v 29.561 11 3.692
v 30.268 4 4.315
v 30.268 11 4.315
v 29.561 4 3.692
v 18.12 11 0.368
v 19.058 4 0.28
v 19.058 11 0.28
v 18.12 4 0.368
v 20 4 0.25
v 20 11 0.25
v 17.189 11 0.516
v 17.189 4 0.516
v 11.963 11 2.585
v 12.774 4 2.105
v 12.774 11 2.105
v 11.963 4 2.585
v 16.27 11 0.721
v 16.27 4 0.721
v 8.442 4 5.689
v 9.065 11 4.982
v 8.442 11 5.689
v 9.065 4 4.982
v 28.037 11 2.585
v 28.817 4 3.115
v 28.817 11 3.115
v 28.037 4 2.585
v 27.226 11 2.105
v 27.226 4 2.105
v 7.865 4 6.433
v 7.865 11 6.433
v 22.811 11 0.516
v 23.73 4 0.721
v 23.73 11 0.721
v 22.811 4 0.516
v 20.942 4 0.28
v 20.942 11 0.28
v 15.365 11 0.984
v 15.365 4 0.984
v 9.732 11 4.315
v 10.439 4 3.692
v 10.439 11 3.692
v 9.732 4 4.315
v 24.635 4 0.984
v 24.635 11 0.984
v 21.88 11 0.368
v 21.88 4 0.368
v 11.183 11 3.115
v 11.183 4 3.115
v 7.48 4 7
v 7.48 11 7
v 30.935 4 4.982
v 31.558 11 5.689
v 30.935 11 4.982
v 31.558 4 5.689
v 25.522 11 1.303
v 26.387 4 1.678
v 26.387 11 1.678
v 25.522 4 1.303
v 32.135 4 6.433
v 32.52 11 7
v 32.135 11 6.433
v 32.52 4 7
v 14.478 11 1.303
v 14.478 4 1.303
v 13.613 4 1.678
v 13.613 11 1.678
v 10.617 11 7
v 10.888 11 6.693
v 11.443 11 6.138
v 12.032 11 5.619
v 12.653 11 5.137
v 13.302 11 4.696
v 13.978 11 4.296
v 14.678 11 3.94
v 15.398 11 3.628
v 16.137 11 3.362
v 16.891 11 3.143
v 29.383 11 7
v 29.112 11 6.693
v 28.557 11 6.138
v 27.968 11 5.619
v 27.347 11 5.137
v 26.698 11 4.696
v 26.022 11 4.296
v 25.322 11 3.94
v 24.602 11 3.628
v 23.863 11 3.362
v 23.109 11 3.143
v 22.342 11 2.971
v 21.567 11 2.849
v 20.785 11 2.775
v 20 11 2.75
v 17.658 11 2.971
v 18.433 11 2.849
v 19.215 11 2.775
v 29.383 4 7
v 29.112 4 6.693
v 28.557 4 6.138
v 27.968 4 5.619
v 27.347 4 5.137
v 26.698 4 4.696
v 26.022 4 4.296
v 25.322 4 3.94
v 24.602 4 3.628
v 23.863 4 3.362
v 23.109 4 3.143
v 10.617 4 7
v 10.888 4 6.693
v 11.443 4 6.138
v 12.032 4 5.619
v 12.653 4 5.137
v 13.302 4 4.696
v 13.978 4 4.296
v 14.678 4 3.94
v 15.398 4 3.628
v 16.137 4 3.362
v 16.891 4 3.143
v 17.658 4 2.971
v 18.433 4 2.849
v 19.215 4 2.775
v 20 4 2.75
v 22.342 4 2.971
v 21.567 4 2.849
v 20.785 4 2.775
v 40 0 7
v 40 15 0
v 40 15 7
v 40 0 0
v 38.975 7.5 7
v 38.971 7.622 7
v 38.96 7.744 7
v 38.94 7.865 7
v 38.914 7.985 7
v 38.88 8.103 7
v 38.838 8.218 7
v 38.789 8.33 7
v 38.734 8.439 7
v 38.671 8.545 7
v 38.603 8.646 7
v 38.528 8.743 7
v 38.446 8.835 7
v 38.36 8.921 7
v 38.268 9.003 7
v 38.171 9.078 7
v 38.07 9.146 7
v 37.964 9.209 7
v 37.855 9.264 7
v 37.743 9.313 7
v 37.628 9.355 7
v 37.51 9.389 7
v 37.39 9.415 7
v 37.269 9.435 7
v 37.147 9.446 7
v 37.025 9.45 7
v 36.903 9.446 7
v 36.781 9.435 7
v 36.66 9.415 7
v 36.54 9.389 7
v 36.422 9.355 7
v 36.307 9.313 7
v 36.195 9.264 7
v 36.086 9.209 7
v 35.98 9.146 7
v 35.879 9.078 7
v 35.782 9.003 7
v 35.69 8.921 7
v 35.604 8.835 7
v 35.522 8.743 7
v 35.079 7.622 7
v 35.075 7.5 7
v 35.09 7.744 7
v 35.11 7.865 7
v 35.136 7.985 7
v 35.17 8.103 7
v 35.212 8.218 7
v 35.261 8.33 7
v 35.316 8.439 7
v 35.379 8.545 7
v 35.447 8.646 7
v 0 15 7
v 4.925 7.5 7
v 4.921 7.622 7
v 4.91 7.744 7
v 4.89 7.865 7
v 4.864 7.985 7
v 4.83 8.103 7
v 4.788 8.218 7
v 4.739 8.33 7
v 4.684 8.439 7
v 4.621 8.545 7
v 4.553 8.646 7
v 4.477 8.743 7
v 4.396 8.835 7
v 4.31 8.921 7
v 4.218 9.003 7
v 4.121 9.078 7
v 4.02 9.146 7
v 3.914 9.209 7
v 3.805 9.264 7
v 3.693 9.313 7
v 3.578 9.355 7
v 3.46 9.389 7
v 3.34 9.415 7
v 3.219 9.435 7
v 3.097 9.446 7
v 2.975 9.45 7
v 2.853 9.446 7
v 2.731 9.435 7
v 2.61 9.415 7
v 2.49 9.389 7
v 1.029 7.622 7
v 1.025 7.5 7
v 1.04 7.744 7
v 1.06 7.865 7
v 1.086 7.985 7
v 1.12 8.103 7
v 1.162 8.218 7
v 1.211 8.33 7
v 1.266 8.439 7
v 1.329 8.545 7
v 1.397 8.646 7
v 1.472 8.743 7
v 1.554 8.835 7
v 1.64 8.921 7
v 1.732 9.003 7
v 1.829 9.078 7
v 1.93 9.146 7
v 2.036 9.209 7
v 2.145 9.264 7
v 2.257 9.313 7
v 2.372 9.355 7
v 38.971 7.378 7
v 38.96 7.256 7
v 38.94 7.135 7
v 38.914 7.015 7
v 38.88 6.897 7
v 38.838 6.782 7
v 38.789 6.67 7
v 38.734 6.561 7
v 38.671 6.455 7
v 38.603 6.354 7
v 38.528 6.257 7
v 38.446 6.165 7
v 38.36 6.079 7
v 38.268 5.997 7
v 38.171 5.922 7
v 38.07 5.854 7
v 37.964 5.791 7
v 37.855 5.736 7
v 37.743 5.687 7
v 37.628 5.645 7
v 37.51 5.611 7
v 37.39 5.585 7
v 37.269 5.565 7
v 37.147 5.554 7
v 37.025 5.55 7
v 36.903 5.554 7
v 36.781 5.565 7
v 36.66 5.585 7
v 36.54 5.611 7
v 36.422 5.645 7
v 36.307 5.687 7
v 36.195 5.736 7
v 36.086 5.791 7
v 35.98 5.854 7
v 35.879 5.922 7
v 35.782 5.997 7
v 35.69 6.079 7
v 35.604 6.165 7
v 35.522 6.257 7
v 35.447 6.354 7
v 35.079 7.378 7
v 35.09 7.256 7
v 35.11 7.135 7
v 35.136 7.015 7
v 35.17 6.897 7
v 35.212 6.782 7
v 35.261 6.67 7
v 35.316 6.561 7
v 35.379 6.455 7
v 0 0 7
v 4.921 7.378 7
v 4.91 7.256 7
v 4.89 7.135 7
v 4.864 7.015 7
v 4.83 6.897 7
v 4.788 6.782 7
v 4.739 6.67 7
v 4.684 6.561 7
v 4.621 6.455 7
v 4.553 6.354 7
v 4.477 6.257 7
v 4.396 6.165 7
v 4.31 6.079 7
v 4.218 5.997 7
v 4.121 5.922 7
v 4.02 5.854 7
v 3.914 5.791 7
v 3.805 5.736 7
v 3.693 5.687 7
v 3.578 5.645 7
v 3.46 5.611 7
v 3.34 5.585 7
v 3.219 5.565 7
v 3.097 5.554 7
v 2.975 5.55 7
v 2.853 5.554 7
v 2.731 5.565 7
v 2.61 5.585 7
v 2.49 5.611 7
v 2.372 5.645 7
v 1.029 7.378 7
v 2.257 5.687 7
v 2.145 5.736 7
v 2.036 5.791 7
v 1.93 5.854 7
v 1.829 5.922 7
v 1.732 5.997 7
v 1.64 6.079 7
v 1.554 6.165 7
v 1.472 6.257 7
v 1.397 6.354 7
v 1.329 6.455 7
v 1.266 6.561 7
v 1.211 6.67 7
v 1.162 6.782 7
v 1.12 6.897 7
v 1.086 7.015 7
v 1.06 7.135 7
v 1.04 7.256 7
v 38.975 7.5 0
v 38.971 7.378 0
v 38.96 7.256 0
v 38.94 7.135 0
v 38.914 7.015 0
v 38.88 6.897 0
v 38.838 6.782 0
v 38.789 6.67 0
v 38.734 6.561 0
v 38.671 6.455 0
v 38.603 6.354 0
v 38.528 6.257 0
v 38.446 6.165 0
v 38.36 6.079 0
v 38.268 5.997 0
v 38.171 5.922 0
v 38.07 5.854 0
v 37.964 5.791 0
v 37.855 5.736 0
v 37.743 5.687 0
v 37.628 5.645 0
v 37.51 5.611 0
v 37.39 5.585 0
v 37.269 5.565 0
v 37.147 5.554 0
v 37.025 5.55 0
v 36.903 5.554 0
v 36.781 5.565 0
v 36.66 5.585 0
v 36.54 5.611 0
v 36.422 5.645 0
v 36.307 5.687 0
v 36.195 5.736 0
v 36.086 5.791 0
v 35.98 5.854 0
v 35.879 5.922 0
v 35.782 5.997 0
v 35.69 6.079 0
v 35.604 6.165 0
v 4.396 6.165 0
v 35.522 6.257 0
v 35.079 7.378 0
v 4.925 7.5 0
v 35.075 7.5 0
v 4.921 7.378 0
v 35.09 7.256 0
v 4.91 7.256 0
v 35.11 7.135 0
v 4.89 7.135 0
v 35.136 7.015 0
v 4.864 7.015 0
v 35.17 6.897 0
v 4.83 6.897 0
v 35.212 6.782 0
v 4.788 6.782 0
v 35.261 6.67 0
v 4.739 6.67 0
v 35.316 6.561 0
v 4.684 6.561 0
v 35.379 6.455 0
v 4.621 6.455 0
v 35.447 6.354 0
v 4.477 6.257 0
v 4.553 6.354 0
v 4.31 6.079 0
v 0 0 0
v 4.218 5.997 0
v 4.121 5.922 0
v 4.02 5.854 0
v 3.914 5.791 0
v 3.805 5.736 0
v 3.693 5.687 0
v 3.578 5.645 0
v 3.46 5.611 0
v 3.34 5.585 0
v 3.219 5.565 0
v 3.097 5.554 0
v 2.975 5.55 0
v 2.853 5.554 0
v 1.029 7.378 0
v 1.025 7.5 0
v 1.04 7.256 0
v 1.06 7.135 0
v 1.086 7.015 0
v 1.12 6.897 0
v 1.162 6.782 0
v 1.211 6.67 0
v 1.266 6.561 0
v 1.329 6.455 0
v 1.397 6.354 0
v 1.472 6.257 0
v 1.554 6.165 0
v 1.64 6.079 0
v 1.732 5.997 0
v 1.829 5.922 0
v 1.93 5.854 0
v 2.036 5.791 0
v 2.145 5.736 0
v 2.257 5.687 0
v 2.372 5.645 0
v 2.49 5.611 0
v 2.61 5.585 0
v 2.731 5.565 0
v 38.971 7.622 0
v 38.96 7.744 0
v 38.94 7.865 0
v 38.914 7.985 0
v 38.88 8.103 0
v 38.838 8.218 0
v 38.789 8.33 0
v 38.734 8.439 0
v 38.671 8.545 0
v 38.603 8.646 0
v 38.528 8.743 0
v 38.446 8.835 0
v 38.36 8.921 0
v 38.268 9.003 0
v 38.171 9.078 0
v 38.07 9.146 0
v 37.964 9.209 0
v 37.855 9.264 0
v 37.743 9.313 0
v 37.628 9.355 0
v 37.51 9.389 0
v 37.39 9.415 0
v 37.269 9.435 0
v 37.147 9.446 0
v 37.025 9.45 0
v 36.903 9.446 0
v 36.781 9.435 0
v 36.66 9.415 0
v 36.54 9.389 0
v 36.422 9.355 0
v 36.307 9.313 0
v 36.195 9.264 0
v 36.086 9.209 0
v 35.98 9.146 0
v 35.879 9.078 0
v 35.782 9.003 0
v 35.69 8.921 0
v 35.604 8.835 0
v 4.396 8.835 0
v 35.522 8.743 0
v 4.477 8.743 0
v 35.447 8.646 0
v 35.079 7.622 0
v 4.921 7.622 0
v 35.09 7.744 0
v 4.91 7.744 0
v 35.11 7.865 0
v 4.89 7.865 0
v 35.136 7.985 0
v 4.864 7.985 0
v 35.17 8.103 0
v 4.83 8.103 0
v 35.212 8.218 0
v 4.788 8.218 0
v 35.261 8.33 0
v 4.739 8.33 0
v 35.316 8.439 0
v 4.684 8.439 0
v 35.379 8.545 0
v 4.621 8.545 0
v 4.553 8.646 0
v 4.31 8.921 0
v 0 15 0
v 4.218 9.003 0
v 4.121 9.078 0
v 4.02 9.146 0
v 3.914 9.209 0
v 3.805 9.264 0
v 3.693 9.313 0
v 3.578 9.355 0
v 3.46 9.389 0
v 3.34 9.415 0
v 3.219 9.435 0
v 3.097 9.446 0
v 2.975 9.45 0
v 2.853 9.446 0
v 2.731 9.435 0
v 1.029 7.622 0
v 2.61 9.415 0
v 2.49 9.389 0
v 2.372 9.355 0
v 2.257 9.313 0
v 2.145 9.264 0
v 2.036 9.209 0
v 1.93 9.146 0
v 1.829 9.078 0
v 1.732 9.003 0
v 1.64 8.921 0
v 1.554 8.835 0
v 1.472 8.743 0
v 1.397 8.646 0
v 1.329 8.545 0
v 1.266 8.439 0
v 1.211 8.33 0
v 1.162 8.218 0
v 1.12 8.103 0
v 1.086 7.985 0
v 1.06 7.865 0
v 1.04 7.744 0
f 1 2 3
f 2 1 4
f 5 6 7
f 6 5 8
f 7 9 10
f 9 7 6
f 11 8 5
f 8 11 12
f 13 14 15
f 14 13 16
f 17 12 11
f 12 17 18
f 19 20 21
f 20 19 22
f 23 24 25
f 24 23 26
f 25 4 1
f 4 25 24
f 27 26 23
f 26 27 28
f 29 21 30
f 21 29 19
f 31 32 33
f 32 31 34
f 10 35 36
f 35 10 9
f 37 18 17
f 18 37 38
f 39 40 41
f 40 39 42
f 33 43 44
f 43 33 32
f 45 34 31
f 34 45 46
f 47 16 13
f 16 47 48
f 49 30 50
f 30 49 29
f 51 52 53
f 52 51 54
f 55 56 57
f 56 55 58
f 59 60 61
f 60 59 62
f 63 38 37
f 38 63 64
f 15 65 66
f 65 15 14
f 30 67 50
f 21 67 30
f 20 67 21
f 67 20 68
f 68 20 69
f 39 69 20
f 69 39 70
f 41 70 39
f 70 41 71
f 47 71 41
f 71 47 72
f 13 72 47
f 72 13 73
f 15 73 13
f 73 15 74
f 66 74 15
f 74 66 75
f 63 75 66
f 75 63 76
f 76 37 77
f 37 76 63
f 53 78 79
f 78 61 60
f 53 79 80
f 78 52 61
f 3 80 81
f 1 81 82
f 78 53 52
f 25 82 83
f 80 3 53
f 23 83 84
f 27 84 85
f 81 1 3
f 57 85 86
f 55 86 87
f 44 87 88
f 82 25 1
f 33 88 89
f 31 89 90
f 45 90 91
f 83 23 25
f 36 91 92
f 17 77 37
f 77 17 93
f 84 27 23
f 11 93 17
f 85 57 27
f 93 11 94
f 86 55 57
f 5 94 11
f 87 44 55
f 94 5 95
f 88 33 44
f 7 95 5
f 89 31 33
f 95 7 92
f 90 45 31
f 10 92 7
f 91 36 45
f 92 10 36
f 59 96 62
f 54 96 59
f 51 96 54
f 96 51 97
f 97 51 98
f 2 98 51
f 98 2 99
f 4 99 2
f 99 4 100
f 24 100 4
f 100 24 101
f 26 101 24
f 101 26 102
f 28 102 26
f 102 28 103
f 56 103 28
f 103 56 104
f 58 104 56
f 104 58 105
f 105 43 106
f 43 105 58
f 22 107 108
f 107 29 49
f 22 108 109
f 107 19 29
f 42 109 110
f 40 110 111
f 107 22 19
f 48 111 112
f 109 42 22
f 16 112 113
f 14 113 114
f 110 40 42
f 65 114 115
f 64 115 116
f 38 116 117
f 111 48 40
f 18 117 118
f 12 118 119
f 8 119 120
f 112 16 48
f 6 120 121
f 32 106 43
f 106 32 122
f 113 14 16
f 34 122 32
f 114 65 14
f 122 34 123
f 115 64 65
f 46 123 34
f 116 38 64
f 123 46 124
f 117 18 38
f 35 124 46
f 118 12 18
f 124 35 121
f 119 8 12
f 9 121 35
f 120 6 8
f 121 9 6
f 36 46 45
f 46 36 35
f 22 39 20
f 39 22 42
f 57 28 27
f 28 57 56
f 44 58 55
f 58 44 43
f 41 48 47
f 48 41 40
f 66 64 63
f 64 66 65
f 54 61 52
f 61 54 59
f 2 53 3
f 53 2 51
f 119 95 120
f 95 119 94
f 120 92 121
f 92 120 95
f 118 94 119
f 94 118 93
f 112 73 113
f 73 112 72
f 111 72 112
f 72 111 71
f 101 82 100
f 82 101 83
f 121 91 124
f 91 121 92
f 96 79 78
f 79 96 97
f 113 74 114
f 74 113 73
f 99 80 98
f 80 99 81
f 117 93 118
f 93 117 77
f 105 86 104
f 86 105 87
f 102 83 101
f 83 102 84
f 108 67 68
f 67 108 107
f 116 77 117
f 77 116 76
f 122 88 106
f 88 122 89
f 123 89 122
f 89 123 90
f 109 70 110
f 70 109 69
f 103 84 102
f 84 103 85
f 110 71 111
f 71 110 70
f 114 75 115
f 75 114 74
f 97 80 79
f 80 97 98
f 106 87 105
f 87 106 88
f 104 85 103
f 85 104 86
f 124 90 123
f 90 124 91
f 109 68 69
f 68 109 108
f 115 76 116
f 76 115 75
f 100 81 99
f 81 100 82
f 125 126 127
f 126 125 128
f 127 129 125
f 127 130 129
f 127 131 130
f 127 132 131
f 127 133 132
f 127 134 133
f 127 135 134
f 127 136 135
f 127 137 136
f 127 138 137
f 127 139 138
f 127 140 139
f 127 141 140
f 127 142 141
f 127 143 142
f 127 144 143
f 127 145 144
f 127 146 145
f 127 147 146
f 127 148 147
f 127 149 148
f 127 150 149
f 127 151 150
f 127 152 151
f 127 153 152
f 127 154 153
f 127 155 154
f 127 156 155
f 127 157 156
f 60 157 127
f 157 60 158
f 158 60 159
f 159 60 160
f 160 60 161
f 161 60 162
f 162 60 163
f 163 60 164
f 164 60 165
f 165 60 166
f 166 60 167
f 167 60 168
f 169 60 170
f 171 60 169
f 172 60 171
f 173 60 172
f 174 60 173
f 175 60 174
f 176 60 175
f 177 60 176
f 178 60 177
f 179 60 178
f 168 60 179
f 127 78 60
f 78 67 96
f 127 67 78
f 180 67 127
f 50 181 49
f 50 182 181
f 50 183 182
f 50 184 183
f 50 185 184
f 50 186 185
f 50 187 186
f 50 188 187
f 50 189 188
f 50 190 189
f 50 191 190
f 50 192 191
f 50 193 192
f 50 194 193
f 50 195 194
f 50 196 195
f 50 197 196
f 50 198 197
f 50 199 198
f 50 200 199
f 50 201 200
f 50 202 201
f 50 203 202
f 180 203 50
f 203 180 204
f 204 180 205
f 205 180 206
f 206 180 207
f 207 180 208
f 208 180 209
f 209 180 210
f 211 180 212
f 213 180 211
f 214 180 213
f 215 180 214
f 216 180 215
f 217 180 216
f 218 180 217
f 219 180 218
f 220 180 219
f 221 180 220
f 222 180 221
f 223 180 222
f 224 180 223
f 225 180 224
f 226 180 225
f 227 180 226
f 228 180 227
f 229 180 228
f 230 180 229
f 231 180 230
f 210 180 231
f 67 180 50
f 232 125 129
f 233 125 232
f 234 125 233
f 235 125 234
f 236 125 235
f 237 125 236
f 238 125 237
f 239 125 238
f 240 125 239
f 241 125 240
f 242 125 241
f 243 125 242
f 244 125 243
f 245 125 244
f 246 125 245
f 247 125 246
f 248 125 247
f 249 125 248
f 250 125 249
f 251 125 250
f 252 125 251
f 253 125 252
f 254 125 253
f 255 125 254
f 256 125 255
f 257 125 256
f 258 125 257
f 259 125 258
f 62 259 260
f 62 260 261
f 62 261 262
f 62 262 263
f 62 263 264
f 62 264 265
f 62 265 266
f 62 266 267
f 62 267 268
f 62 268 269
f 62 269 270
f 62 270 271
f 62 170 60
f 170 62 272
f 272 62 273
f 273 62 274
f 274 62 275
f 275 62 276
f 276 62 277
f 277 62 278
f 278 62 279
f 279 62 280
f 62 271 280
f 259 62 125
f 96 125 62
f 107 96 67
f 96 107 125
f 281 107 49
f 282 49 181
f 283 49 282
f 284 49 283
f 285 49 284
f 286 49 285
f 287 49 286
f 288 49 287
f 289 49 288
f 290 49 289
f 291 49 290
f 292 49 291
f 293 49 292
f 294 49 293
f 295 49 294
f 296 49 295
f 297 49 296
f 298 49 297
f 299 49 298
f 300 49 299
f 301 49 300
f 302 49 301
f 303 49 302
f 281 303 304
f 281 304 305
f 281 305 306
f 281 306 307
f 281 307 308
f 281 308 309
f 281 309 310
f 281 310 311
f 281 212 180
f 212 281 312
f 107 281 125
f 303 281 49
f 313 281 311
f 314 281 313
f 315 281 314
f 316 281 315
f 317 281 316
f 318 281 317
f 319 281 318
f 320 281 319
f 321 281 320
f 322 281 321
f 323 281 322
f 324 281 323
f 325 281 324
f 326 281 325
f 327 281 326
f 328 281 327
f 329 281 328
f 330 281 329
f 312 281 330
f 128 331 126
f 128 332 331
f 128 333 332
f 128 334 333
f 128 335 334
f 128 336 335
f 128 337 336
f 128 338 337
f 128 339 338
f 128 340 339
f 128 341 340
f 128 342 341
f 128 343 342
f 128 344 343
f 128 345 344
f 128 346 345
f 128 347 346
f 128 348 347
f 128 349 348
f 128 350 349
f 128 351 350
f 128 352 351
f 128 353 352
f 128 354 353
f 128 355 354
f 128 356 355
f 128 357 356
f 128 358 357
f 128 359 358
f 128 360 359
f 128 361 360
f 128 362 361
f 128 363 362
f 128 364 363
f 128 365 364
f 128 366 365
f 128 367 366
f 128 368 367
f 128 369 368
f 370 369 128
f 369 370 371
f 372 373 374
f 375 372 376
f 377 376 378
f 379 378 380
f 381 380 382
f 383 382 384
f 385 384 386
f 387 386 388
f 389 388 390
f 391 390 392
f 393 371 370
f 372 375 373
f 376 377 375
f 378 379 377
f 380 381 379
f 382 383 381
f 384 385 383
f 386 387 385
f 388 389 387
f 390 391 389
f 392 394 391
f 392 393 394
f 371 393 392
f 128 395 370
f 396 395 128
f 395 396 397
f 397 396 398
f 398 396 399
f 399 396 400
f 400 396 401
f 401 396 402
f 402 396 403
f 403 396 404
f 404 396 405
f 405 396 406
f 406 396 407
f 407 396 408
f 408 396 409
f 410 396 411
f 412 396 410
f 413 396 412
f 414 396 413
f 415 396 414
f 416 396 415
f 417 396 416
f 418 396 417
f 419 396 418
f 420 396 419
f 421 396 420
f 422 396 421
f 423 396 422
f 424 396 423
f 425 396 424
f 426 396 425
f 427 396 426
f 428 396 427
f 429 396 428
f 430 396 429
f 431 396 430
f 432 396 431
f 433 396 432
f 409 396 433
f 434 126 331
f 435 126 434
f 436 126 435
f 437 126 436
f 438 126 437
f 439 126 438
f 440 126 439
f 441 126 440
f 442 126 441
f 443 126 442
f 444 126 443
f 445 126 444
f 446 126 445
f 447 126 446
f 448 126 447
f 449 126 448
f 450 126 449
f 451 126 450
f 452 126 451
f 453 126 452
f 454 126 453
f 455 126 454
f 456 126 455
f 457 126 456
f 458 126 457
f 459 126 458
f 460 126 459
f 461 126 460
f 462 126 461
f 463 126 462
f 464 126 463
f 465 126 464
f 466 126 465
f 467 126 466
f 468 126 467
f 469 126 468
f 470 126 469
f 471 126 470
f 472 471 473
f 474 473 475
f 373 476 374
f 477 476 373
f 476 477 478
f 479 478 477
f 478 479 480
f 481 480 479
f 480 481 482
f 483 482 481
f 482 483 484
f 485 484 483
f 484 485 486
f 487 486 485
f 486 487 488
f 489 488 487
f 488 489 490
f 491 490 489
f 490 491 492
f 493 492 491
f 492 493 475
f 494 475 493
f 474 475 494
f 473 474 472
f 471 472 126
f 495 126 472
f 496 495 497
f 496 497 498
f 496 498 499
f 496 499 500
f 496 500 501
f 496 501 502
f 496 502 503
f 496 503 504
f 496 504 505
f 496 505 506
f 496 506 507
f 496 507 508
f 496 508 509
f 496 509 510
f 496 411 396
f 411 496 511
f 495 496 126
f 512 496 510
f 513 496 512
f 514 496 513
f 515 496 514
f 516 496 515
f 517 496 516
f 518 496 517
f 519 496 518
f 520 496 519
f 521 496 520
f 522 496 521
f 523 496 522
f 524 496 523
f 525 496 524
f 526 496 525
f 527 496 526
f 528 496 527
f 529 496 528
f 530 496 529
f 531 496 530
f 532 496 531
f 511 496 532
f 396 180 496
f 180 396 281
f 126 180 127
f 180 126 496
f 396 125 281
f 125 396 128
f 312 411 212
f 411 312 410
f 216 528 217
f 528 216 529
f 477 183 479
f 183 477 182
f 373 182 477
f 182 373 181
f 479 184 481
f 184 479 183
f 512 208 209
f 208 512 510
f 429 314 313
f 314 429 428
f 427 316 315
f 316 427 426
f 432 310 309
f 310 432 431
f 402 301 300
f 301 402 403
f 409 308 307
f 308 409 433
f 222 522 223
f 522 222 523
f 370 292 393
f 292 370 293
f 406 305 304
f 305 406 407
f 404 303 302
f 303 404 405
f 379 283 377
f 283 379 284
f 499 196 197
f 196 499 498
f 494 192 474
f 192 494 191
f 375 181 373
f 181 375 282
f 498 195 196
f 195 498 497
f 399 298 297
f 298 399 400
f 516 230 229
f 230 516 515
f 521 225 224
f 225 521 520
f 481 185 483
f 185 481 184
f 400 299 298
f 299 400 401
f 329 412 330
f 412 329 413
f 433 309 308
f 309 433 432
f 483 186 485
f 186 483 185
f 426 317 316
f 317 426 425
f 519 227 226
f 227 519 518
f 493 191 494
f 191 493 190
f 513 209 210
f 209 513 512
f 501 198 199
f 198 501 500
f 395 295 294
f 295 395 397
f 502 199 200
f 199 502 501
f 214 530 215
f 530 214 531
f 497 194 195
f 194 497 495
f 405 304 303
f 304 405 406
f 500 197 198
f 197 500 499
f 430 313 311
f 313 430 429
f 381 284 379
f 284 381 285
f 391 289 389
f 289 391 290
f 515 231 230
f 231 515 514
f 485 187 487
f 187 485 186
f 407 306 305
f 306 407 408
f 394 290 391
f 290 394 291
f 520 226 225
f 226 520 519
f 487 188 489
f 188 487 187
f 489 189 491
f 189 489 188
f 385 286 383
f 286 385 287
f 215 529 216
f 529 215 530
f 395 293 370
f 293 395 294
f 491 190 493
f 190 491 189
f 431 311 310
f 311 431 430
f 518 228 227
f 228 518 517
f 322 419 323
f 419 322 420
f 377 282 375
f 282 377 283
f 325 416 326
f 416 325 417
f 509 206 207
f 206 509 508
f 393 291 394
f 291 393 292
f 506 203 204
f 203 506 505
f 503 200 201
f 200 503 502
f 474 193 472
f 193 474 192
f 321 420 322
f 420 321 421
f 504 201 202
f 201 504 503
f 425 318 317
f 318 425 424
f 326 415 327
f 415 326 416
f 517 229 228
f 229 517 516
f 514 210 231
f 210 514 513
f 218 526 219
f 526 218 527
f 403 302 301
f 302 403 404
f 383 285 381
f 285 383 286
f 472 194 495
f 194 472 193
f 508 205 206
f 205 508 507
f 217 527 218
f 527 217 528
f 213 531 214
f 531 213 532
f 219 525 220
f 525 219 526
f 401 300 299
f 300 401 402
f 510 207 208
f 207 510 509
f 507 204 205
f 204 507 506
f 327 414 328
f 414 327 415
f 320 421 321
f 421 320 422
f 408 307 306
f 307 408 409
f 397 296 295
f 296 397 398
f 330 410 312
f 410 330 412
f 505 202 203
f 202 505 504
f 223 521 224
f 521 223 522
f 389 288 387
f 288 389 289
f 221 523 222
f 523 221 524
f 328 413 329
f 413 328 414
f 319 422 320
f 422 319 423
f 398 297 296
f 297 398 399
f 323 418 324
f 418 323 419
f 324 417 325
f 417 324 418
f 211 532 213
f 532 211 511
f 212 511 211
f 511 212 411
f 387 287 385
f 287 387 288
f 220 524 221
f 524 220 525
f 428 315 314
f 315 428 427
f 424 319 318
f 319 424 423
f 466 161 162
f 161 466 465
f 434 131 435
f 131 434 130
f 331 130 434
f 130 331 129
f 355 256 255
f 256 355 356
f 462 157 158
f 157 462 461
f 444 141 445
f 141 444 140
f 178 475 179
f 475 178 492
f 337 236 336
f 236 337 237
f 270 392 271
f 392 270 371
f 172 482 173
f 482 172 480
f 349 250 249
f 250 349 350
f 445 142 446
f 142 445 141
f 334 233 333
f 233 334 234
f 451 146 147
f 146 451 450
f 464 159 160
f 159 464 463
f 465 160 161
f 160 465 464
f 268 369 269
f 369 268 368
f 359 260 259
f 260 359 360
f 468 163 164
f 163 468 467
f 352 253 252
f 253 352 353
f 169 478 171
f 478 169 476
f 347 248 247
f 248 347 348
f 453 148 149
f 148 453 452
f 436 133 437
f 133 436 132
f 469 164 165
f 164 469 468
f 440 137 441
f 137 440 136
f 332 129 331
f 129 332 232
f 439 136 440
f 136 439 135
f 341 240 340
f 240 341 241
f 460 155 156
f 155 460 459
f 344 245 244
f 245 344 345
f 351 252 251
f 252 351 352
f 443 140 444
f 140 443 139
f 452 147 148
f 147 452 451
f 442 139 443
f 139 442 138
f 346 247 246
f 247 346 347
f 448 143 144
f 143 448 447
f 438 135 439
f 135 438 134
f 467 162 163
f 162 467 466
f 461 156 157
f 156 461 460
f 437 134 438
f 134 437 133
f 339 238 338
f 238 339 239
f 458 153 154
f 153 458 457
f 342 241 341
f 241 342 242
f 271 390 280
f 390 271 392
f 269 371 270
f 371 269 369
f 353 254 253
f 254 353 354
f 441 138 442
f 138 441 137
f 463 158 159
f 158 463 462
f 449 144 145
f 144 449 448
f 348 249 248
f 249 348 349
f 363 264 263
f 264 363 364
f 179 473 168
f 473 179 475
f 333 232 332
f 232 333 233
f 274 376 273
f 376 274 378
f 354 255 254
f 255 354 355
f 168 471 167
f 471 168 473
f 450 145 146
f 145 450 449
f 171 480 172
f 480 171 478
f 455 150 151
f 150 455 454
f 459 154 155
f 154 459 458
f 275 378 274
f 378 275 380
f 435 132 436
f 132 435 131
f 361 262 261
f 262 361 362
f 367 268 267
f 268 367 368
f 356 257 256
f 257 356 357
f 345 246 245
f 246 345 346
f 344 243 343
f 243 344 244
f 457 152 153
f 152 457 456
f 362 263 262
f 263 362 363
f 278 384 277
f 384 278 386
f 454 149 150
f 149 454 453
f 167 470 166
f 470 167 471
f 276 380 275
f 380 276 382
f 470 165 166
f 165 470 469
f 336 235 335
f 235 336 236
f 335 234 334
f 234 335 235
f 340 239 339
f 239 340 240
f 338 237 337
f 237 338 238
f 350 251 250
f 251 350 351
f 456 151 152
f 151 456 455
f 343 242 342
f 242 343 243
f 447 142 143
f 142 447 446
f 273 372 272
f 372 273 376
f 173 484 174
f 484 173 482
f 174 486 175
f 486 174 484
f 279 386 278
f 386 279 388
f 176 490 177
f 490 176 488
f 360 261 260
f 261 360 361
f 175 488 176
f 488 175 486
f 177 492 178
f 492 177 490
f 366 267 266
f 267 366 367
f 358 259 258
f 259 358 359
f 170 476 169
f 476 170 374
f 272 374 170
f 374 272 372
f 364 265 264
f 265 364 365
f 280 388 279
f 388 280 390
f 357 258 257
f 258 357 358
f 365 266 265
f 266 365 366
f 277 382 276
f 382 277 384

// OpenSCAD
module ring( o_r, i_r, h )
{
    difference(){
        cylinder( r = o_r, h = h, $fn = 100 );
        translate( [ 0, 0, -1 ] )
            cylinder( r = i_r, h = h + 2, $fn = 100 );
    }
}

w = 15;
l = 40;
hole_w = 7;
hole_r = 3.5 / 2 + 0.2;
d = 2;

render( convexity = 10 ){
    
    difference(){
        cube( [ l, w, 7 ] );

        translate( [ l / 2, ( w - hole_w ) / 2, 15.25 ] )
            rotate( 90, [ 0, 0, 1 ] )
                rotate( 90, [ 0, 1, 0 ] )
                    ring( o_r = 15, i_r = 12.5, h = hole_w );
        
        translate( [ hole_r / 2 + d, w / 2, -1 ] )
            cylinder( r = hole_r, h = 9, $fn = 100 );
        translate( [ l - ( hole_r / 2 + d ), w / 2, -1 ] )
            cylinder( r = hole_r, h = 9, $fn = 100 );
    }    
}
